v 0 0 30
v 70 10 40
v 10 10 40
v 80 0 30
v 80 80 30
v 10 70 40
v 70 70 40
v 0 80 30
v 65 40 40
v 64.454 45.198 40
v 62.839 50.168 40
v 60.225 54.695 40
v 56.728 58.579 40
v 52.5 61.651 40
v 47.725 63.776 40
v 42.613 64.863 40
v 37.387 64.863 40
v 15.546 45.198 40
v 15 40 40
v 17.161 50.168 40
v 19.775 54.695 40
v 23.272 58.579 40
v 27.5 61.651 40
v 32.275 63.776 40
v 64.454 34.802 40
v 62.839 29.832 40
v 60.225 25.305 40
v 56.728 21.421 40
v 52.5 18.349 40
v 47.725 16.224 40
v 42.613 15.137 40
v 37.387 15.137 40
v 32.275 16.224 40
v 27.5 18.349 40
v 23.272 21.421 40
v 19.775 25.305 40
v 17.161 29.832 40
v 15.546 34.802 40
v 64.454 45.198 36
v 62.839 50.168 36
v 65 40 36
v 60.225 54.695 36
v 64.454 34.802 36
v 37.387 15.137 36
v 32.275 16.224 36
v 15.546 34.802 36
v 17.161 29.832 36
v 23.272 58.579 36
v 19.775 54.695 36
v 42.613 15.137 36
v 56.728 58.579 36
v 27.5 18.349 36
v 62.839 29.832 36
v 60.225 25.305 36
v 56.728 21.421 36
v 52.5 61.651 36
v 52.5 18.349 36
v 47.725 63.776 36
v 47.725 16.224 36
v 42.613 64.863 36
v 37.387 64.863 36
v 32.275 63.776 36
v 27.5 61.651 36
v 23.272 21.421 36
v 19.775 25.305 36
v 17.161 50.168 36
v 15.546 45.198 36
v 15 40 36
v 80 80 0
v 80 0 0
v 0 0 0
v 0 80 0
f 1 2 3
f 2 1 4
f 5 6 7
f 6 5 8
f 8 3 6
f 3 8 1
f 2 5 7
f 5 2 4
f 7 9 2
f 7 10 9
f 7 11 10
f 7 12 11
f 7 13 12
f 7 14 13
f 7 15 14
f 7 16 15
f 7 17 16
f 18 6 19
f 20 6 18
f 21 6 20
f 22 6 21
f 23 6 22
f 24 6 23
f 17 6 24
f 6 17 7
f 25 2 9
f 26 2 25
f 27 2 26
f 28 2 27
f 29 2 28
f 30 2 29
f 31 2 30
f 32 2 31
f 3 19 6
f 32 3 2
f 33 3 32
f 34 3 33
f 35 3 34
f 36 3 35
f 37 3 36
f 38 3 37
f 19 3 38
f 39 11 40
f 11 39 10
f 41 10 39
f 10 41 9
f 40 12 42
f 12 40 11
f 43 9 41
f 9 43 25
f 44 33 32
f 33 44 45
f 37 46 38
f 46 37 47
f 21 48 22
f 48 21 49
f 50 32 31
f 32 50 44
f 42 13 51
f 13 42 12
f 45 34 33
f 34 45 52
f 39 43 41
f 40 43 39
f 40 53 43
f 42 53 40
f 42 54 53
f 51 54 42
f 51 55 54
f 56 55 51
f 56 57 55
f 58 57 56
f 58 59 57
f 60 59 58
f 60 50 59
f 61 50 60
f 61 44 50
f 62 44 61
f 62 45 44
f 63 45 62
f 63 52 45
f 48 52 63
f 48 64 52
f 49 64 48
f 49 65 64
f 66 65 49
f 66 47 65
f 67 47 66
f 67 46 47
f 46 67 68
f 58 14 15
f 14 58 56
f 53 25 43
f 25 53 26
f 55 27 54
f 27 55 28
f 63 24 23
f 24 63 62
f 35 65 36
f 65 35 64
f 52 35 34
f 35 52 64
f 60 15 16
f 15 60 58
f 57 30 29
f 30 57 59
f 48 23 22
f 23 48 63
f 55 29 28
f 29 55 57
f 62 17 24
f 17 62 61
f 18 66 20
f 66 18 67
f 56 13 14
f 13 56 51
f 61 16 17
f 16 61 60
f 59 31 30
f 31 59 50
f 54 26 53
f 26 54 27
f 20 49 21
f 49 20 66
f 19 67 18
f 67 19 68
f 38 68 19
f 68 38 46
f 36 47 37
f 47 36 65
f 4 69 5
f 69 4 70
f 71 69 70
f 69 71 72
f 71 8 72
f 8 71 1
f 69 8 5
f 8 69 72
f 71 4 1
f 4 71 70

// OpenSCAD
height_top = 10;
width_top = 60;
height_bottom = 30;
width_bottom = 80;
hole_width = 50;
hole_depth = 5;
root_2 = 1.414213562;

difference() {
    translate([width_bottom/2, width_bottom/2, height_bottom]) {
        rotate([0,0,45]) {
            cylinder(h=height_top,d1=width_bottom*root_2,d2=width_top*root_2,$fn=4);
        }
    }
    translate([width_bottom/2, width_bottom/2, height_bottom + height_top - hole_depth + 1]) {
        cylinder(h=hole_depth + 1,d=hole_width);
    }
}

cube([width_bottom, width_bottom, height_bottom]);
